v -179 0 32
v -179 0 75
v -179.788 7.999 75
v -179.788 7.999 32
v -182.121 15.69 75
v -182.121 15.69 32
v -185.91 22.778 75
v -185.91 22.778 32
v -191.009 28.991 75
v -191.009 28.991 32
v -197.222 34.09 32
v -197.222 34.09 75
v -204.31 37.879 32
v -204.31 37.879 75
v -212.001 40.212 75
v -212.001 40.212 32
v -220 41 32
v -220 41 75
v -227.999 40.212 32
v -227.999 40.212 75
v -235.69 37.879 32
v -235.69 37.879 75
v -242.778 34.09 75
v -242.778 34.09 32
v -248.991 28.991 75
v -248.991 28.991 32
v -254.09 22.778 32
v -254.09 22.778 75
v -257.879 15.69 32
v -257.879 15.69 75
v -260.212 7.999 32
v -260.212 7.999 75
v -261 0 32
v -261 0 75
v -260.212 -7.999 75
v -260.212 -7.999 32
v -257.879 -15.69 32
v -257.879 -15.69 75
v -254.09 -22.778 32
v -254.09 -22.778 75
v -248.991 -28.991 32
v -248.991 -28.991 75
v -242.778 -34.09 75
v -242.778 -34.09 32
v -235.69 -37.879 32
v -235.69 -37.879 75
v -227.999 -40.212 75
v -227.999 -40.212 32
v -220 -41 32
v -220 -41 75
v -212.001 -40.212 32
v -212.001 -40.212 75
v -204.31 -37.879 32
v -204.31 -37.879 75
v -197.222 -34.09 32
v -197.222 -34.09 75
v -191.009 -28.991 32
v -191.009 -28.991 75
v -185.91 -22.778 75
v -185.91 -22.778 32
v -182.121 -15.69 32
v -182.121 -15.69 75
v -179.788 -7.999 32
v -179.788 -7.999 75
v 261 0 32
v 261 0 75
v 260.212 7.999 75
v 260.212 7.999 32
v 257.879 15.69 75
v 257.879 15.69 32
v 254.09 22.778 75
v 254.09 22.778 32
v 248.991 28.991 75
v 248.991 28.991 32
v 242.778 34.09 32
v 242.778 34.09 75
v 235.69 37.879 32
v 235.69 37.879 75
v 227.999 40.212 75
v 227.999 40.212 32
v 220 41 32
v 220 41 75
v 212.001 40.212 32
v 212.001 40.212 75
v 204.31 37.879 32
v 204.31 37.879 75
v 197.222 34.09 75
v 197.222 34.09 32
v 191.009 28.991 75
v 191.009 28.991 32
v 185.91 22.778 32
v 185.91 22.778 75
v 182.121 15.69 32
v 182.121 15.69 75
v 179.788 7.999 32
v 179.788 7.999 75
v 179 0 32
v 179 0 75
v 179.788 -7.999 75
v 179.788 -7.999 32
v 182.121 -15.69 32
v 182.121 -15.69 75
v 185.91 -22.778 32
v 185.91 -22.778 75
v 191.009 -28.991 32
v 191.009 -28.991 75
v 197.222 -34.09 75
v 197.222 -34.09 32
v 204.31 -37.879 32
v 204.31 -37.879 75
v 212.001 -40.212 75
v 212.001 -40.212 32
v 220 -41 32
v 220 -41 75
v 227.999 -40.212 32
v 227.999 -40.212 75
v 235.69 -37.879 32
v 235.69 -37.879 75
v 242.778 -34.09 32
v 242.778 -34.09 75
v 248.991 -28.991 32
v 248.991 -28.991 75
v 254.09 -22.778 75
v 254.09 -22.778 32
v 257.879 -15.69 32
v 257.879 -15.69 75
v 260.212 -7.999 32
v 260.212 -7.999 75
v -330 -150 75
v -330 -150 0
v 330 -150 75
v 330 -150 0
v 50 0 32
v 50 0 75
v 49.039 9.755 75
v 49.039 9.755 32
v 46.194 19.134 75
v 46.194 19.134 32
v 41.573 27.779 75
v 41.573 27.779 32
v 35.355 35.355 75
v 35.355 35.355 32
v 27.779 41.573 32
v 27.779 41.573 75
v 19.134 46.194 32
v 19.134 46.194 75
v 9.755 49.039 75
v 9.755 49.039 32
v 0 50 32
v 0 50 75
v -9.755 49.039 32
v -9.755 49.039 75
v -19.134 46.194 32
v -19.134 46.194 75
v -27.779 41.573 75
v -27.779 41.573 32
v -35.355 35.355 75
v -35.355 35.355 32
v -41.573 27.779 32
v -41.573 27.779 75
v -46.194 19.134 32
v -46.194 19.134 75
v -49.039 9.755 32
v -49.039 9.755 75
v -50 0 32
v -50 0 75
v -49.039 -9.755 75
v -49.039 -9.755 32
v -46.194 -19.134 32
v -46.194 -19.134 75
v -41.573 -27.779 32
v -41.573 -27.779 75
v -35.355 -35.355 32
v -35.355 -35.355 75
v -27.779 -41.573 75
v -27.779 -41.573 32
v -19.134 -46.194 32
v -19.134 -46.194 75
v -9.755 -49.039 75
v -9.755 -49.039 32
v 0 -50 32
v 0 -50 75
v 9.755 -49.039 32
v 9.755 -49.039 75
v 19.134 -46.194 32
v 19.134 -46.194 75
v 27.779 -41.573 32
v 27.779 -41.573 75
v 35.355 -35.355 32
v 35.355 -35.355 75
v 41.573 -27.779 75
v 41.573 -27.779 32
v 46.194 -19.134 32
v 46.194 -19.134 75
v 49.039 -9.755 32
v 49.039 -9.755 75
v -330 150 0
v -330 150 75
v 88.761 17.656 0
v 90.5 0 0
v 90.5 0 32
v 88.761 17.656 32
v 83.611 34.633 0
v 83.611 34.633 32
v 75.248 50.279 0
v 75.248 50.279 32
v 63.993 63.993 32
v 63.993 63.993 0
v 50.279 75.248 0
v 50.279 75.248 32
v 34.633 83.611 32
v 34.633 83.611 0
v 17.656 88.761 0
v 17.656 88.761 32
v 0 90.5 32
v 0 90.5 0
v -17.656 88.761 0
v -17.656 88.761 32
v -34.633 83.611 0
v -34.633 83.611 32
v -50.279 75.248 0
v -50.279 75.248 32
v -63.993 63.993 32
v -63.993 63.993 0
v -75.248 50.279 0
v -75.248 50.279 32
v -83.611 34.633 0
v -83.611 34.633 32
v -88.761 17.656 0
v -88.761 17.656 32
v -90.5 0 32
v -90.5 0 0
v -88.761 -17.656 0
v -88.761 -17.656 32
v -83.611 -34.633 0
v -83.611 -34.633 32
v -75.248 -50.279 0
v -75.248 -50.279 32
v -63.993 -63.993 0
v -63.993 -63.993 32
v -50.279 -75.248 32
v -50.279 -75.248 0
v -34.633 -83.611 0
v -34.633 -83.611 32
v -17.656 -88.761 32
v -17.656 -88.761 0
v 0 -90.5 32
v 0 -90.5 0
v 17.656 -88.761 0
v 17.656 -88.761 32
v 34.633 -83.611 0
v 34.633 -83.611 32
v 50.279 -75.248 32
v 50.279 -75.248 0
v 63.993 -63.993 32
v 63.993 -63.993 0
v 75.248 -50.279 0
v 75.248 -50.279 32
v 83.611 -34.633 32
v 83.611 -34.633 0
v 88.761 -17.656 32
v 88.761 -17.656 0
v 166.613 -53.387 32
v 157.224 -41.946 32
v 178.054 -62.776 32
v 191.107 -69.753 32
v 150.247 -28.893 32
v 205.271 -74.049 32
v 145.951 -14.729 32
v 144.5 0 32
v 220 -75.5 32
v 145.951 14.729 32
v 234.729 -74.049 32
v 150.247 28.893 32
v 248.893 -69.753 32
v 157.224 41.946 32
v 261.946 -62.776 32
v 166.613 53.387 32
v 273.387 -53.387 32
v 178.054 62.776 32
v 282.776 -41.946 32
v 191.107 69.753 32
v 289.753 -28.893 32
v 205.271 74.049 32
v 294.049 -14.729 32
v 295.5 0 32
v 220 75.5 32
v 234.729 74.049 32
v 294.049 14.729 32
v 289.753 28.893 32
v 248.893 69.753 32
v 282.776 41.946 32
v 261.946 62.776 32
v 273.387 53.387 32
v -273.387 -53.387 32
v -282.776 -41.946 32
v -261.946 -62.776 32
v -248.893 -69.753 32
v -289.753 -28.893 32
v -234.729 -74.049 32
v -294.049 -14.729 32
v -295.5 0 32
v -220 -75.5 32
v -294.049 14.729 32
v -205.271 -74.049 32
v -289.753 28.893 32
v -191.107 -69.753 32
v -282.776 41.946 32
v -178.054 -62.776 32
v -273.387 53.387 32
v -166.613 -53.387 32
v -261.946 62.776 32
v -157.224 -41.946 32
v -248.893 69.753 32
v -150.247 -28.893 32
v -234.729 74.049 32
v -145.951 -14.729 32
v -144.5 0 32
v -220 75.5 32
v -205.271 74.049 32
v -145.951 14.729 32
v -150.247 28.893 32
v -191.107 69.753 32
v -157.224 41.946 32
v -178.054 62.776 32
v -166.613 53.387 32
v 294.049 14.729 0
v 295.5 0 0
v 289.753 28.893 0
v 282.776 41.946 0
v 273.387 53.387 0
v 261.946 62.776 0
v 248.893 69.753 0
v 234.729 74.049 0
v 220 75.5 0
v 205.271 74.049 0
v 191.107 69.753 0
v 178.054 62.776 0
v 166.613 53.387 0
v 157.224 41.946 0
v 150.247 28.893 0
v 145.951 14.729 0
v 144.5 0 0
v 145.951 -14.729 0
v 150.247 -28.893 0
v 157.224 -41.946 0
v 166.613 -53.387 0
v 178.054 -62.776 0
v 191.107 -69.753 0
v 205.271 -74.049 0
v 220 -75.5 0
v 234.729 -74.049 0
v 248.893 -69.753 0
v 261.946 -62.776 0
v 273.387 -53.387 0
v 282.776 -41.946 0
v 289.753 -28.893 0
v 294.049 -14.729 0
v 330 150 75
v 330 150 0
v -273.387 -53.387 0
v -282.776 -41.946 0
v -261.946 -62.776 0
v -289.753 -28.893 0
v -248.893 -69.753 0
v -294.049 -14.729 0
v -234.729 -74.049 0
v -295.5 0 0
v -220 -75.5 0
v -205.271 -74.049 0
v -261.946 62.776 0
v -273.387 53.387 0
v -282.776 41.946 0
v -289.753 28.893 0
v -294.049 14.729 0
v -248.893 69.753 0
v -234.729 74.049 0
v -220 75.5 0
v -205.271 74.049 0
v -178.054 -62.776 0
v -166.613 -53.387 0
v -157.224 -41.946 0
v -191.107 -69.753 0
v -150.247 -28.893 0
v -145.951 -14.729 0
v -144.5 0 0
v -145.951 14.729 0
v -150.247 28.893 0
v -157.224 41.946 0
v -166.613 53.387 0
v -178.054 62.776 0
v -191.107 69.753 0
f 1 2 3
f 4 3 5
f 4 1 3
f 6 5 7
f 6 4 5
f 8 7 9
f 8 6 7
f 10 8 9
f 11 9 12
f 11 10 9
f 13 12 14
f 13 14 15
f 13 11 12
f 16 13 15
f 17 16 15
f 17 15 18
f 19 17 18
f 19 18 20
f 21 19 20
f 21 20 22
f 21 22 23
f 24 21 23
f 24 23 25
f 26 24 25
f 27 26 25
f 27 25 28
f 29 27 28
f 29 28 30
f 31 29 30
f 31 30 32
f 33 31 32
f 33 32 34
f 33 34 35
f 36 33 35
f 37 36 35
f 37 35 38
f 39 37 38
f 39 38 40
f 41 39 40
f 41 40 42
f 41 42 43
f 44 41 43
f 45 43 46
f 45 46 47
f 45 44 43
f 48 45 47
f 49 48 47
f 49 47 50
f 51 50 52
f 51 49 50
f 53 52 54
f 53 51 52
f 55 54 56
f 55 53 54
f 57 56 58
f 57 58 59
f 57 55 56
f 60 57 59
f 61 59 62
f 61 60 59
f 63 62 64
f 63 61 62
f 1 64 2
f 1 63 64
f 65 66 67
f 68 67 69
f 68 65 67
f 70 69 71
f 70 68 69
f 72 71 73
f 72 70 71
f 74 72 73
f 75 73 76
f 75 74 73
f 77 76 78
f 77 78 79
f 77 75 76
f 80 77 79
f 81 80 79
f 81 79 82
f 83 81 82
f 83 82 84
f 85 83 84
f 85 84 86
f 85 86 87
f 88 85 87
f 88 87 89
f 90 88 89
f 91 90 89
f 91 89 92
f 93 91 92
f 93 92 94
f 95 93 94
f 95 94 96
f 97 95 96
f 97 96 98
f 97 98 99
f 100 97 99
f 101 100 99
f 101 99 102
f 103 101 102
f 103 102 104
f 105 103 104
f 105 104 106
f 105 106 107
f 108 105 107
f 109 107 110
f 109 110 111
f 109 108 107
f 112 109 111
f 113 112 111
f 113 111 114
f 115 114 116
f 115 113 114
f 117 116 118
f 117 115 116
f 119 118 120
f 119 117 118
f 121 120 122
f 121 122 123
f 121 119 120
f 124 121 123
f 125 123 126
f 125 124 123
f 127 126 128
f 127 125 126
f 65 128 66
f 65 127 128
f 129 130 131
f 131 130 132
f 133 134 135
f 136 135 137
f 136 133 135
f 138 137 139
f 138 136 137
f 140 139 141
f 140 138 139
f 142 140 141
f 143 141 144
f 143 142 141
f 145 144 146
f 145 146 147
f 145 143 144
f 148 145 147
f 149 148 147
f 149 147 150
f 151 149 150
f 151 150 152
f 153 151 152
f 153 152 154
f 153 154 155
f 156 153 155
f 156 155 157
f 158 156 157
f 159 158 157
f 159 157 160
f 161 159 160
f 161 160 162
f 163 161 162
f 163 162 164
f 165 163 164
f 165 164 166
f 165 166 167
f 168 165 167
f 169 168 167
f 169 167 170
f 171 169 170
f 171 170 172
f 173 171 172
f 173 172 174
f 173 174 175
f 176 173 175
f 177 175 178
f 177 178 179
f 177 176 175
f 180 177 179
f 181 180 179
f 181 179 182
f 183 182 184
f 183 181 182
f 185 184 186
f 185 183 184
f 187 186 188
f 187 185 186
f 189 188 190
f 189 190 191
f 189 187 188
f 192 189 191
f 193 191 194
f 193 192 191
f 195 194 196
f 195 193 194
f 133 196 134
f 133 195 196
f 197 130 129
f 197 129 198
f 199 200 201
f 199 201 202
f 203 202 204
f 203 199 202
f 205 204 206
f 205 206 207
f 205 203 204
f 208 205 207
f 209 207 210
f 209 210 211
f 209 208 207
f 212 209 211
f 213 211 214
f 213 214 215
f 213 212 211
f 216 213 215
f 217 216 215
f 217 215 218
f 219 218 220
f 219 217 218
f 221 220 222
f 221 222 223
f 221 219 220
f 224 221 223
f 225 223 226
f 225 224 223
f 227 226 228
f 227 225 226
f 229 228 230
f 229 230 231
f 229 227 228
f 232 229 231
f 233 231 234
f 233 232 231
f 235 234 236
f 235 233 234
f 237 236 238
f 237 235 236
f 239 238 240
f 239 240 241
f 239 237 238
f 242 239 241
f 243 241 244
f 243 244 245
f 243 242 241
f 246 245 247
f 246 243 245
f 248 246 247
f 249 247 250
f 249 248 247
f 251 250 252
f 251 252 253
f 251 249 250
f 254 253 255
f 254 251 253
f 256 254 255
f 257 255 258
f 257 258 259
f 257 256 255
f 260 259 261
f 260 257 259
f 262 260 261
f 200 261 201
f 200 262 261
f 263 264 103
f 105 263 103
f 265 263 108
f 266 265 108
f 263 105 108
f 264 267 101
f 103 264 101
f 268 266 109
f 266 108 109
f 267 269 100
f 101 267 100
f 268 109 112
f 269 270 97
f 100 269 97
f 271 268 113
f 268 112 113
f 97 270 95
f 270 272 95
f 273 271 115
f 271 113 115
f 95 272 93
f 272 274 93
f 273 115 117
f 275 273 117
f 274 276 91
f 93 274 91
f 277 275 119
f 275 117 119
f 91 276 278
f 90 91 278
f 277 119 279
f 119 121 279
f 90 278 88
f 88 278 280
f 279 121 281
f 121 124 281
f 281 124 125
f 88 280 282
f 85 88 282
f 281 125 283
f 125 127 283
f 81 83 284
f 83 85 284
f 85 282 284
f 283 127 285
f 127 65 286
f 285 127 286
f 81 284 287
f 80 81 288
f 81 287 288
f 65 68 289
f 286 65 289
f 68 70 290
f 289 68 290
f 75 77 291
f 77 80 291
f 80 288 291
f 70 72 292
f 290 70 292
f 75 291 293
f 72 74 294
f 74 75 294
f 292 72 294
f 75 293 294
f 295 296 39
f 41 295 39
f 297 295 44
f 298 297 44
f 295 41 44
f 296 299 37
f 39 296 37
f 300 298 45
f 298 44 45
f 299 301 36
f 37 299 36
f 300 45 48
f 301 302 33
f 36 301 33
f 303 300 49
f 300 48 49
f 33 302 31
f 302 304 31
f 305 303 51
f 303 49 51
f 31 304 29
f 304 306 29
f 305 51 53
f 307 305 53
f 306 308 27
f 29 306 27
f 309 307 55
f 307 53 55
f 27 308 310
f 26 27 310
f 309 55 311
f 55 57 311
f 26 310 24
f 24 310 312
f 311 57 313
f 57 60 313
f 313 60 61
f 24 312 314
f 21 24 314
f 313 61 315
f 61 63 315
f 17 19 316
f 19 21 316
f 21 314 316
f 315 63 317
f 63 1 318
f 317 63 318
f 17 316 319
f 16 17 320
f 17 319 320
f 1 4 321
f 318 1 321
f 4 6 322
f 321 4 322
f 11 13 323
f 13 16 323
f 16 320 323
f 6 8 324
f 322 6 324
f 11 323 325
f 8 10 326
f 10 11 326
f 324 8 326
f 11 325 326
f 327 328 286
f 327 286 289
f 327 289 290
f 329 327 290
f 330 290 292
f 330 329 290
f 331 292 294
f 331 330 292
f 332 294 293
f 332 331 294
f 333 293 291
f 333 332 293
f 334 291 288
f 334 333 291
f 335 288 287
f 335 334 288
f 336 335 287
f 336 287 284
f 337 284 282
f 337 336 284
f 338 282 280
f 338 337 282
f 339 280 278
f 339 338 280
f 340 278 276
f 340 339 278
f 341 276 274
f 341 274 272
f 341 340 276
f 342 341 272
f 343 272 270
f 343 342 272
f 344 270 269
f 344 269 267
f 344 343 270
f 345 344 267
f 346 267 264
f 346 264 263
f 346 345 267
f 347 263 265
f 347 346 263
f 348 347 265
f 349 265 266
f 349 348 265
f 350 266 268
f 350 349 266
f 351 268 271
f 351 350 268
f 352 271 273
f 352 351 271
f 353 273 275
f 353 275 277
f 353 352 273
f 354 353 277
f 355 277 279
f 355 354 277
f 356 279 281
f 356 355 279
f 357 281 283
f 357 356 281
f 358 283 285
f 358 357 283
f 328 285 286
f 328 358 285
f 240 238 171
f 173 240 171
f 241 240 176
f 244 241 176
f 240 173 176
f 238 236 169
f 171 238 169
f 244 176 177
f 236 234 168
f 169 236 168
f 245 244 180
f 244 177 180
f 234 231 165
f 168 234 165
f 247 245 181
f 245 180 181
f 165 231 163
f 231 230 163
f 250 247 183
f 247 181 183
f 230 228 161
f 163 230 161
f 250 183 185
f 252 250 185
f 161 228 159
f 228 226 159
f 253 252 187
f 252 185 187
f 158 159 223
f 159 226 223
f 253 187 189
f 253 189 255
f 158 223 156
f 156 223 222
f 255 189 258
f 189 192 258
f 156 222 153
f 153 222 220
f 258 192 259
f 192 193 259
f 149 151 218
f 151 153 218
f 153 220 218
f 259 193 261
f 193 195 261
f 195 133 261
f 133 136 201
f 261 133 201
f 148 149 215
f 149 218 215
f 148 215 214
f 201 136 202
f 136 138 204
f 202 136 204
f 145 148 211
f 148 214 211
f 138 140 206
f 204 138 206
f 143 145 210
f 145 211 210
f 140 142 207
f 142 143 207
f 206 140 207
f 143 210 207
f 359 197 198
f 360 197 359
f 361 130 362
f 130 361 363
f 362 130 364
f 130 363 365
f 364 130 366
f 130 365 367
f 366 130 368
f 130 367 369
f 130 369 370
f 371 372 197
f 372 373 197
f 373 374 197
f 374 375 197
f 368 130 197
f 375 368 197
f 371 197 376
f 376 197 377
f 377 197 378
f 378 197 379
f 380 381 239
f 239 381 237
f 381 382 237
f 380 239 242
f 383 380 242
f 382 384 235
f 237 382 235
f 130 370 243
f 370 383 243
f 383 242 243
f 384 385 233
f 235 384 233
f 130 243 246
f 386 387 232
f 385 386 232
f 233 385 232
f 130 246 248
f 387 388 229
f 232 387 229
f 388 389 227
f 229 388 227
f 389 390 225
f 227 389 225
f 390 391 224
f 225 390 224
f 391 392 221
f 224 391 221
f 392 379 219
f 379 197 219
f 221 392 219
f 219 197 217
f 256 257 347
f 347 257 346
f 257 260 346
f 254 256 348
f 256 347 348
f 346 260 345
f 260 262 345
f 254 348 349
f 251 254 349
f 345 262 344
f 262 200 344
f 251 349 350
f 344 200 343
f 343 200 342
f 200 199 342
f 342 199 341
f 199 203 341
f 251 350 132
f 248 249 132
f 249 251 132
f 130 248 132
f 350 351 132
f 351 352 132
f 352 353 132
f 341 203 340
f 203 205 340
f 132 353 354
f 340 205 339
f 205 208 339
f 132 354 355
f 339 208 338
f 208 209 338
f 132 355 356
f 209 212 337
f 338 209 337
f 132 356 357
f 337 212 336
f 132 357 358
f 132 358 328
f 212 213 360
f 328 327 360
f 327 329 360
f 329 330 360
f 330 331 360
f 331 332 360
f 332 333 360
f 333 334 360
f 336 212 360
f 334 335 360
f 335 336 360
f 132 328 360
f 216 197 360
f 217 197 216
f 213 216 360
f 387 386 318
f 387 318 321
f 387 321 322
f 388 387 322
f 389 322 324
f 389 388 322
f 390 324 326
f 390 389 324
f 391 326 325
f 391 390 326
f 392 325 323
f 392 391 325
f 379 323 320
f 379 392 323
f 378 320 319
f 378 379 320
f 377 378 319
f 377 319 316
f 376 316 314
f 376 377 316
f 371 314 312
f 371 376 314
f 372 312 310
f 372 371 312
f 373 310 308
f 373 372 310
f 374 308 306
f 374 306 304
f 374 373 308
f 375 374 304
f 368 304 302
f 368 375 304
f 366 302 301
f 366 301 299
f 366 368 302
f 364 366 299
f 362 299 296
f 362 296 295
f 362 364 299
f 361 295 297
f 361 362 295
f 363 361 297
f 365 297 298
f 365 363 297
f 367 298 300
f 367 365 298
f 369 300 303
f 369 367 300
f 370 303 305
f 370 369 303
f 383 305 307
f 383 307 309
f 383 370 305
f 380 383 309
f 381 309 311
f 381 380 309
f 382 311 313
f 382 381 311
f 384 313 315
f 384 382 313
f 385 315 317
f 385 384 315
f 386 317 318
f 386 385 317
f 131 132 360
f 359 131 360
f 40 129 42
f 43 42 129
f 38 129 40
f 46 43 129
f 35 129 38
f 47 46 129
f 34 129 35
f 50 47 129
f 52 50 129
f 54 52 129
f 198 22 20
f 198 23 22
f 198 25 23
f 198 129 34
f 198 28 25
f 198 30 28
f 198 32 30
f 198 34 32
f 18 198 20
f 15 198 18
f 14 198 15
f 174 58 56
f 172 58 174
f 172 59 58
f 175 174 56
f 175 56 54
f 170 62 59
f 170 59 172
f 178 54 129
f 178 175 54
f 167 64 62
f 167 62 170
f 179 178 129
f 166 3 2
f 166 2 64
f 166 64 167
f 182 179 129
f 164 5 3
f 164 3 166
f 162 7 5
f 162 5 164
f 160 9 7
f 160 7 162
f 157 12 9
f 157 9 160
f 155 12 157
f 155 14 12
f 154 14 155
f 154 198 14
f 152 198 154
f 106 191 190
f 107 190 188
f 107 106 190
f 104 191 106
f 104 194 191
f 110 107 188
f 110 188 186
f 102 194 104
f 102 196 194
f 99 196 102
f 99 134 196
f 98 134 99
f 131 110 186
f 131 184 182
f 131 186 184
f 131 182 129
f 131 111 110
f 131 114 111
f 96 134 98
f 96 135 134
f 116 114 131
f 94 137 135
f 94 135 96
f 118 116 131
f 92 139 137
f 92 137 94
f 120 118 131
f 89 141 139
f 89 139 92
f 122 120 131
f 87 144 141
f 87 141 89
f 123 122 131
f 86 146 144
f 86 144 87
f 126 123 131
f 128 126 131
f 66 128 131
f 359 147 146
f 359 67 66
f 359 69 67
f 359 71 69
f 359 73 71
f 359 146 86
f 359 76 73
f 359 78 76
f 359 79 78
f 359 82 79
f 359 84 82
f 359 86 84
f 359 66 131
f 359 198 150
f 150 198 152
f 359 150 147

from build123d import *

# Parameters (mm, degrees)
F0_W     = 660
F0_H     = 300
F0_R     = 75.5
F0_R_2   = 90.5
F0_R_3   = 41
F0_R_4   = 50
F1_DEPTH = 75
F2_DEPTH = 32


with BuildPart() as f1:
    # F0 (on Top) → F1 (new body)
    with BuildSketch(Plane.XY):
        Rectangle(F0_W, F0_H)
        with Locations((-220, 0)):
            Circle(F0_R, mode=Mode.SUBTRACT)
        Circle(F0_R_2, mode=Mode.SUBTRACT)
        with Locations((220, 0)):
            Circle(F0_R, mode=Mode.SUBTRACT)
        with Locations((-220, 0)):
            Circle(F0_R)
        with Locations((-220, 0)):
            Circle(F0_R_3, mode=Mode.SUBTRACT)
        Circle(F0_R_2)
        Circle(F0_R_4, mode=Mode.SUBTRACT)
        with Locations((220, 0)):
            Circle(F0_R)
        with Locations((220, 0)):
            Circle(F0_R_3, mode=Mode.SUBTRACT)
    extrude(amount=F1_DEPTH)

    # F0 (on Top) → F2 (cut)
    with BuildSketch(Plane.XY):
        with Locations((-220, 0)):
            Circle(F0_R)
        with Locations((-220, 0)):
            Circle(F0_R_3, mode=Mode.SUBTRACT)
        Circle(F0_R_2)
        Circle(F0_R_4, mode=Mode.SUBTRACT)
        with Locations((220, 0)):
            Circle(F0_R)
        with Locations((220, 0)):
            Circle(F0_R_3, mode=Mode.SUBTRACT)
    extrude(amount=F2_DEPTH, mode=Mode.SUBTRACT)


solid = f1.part
